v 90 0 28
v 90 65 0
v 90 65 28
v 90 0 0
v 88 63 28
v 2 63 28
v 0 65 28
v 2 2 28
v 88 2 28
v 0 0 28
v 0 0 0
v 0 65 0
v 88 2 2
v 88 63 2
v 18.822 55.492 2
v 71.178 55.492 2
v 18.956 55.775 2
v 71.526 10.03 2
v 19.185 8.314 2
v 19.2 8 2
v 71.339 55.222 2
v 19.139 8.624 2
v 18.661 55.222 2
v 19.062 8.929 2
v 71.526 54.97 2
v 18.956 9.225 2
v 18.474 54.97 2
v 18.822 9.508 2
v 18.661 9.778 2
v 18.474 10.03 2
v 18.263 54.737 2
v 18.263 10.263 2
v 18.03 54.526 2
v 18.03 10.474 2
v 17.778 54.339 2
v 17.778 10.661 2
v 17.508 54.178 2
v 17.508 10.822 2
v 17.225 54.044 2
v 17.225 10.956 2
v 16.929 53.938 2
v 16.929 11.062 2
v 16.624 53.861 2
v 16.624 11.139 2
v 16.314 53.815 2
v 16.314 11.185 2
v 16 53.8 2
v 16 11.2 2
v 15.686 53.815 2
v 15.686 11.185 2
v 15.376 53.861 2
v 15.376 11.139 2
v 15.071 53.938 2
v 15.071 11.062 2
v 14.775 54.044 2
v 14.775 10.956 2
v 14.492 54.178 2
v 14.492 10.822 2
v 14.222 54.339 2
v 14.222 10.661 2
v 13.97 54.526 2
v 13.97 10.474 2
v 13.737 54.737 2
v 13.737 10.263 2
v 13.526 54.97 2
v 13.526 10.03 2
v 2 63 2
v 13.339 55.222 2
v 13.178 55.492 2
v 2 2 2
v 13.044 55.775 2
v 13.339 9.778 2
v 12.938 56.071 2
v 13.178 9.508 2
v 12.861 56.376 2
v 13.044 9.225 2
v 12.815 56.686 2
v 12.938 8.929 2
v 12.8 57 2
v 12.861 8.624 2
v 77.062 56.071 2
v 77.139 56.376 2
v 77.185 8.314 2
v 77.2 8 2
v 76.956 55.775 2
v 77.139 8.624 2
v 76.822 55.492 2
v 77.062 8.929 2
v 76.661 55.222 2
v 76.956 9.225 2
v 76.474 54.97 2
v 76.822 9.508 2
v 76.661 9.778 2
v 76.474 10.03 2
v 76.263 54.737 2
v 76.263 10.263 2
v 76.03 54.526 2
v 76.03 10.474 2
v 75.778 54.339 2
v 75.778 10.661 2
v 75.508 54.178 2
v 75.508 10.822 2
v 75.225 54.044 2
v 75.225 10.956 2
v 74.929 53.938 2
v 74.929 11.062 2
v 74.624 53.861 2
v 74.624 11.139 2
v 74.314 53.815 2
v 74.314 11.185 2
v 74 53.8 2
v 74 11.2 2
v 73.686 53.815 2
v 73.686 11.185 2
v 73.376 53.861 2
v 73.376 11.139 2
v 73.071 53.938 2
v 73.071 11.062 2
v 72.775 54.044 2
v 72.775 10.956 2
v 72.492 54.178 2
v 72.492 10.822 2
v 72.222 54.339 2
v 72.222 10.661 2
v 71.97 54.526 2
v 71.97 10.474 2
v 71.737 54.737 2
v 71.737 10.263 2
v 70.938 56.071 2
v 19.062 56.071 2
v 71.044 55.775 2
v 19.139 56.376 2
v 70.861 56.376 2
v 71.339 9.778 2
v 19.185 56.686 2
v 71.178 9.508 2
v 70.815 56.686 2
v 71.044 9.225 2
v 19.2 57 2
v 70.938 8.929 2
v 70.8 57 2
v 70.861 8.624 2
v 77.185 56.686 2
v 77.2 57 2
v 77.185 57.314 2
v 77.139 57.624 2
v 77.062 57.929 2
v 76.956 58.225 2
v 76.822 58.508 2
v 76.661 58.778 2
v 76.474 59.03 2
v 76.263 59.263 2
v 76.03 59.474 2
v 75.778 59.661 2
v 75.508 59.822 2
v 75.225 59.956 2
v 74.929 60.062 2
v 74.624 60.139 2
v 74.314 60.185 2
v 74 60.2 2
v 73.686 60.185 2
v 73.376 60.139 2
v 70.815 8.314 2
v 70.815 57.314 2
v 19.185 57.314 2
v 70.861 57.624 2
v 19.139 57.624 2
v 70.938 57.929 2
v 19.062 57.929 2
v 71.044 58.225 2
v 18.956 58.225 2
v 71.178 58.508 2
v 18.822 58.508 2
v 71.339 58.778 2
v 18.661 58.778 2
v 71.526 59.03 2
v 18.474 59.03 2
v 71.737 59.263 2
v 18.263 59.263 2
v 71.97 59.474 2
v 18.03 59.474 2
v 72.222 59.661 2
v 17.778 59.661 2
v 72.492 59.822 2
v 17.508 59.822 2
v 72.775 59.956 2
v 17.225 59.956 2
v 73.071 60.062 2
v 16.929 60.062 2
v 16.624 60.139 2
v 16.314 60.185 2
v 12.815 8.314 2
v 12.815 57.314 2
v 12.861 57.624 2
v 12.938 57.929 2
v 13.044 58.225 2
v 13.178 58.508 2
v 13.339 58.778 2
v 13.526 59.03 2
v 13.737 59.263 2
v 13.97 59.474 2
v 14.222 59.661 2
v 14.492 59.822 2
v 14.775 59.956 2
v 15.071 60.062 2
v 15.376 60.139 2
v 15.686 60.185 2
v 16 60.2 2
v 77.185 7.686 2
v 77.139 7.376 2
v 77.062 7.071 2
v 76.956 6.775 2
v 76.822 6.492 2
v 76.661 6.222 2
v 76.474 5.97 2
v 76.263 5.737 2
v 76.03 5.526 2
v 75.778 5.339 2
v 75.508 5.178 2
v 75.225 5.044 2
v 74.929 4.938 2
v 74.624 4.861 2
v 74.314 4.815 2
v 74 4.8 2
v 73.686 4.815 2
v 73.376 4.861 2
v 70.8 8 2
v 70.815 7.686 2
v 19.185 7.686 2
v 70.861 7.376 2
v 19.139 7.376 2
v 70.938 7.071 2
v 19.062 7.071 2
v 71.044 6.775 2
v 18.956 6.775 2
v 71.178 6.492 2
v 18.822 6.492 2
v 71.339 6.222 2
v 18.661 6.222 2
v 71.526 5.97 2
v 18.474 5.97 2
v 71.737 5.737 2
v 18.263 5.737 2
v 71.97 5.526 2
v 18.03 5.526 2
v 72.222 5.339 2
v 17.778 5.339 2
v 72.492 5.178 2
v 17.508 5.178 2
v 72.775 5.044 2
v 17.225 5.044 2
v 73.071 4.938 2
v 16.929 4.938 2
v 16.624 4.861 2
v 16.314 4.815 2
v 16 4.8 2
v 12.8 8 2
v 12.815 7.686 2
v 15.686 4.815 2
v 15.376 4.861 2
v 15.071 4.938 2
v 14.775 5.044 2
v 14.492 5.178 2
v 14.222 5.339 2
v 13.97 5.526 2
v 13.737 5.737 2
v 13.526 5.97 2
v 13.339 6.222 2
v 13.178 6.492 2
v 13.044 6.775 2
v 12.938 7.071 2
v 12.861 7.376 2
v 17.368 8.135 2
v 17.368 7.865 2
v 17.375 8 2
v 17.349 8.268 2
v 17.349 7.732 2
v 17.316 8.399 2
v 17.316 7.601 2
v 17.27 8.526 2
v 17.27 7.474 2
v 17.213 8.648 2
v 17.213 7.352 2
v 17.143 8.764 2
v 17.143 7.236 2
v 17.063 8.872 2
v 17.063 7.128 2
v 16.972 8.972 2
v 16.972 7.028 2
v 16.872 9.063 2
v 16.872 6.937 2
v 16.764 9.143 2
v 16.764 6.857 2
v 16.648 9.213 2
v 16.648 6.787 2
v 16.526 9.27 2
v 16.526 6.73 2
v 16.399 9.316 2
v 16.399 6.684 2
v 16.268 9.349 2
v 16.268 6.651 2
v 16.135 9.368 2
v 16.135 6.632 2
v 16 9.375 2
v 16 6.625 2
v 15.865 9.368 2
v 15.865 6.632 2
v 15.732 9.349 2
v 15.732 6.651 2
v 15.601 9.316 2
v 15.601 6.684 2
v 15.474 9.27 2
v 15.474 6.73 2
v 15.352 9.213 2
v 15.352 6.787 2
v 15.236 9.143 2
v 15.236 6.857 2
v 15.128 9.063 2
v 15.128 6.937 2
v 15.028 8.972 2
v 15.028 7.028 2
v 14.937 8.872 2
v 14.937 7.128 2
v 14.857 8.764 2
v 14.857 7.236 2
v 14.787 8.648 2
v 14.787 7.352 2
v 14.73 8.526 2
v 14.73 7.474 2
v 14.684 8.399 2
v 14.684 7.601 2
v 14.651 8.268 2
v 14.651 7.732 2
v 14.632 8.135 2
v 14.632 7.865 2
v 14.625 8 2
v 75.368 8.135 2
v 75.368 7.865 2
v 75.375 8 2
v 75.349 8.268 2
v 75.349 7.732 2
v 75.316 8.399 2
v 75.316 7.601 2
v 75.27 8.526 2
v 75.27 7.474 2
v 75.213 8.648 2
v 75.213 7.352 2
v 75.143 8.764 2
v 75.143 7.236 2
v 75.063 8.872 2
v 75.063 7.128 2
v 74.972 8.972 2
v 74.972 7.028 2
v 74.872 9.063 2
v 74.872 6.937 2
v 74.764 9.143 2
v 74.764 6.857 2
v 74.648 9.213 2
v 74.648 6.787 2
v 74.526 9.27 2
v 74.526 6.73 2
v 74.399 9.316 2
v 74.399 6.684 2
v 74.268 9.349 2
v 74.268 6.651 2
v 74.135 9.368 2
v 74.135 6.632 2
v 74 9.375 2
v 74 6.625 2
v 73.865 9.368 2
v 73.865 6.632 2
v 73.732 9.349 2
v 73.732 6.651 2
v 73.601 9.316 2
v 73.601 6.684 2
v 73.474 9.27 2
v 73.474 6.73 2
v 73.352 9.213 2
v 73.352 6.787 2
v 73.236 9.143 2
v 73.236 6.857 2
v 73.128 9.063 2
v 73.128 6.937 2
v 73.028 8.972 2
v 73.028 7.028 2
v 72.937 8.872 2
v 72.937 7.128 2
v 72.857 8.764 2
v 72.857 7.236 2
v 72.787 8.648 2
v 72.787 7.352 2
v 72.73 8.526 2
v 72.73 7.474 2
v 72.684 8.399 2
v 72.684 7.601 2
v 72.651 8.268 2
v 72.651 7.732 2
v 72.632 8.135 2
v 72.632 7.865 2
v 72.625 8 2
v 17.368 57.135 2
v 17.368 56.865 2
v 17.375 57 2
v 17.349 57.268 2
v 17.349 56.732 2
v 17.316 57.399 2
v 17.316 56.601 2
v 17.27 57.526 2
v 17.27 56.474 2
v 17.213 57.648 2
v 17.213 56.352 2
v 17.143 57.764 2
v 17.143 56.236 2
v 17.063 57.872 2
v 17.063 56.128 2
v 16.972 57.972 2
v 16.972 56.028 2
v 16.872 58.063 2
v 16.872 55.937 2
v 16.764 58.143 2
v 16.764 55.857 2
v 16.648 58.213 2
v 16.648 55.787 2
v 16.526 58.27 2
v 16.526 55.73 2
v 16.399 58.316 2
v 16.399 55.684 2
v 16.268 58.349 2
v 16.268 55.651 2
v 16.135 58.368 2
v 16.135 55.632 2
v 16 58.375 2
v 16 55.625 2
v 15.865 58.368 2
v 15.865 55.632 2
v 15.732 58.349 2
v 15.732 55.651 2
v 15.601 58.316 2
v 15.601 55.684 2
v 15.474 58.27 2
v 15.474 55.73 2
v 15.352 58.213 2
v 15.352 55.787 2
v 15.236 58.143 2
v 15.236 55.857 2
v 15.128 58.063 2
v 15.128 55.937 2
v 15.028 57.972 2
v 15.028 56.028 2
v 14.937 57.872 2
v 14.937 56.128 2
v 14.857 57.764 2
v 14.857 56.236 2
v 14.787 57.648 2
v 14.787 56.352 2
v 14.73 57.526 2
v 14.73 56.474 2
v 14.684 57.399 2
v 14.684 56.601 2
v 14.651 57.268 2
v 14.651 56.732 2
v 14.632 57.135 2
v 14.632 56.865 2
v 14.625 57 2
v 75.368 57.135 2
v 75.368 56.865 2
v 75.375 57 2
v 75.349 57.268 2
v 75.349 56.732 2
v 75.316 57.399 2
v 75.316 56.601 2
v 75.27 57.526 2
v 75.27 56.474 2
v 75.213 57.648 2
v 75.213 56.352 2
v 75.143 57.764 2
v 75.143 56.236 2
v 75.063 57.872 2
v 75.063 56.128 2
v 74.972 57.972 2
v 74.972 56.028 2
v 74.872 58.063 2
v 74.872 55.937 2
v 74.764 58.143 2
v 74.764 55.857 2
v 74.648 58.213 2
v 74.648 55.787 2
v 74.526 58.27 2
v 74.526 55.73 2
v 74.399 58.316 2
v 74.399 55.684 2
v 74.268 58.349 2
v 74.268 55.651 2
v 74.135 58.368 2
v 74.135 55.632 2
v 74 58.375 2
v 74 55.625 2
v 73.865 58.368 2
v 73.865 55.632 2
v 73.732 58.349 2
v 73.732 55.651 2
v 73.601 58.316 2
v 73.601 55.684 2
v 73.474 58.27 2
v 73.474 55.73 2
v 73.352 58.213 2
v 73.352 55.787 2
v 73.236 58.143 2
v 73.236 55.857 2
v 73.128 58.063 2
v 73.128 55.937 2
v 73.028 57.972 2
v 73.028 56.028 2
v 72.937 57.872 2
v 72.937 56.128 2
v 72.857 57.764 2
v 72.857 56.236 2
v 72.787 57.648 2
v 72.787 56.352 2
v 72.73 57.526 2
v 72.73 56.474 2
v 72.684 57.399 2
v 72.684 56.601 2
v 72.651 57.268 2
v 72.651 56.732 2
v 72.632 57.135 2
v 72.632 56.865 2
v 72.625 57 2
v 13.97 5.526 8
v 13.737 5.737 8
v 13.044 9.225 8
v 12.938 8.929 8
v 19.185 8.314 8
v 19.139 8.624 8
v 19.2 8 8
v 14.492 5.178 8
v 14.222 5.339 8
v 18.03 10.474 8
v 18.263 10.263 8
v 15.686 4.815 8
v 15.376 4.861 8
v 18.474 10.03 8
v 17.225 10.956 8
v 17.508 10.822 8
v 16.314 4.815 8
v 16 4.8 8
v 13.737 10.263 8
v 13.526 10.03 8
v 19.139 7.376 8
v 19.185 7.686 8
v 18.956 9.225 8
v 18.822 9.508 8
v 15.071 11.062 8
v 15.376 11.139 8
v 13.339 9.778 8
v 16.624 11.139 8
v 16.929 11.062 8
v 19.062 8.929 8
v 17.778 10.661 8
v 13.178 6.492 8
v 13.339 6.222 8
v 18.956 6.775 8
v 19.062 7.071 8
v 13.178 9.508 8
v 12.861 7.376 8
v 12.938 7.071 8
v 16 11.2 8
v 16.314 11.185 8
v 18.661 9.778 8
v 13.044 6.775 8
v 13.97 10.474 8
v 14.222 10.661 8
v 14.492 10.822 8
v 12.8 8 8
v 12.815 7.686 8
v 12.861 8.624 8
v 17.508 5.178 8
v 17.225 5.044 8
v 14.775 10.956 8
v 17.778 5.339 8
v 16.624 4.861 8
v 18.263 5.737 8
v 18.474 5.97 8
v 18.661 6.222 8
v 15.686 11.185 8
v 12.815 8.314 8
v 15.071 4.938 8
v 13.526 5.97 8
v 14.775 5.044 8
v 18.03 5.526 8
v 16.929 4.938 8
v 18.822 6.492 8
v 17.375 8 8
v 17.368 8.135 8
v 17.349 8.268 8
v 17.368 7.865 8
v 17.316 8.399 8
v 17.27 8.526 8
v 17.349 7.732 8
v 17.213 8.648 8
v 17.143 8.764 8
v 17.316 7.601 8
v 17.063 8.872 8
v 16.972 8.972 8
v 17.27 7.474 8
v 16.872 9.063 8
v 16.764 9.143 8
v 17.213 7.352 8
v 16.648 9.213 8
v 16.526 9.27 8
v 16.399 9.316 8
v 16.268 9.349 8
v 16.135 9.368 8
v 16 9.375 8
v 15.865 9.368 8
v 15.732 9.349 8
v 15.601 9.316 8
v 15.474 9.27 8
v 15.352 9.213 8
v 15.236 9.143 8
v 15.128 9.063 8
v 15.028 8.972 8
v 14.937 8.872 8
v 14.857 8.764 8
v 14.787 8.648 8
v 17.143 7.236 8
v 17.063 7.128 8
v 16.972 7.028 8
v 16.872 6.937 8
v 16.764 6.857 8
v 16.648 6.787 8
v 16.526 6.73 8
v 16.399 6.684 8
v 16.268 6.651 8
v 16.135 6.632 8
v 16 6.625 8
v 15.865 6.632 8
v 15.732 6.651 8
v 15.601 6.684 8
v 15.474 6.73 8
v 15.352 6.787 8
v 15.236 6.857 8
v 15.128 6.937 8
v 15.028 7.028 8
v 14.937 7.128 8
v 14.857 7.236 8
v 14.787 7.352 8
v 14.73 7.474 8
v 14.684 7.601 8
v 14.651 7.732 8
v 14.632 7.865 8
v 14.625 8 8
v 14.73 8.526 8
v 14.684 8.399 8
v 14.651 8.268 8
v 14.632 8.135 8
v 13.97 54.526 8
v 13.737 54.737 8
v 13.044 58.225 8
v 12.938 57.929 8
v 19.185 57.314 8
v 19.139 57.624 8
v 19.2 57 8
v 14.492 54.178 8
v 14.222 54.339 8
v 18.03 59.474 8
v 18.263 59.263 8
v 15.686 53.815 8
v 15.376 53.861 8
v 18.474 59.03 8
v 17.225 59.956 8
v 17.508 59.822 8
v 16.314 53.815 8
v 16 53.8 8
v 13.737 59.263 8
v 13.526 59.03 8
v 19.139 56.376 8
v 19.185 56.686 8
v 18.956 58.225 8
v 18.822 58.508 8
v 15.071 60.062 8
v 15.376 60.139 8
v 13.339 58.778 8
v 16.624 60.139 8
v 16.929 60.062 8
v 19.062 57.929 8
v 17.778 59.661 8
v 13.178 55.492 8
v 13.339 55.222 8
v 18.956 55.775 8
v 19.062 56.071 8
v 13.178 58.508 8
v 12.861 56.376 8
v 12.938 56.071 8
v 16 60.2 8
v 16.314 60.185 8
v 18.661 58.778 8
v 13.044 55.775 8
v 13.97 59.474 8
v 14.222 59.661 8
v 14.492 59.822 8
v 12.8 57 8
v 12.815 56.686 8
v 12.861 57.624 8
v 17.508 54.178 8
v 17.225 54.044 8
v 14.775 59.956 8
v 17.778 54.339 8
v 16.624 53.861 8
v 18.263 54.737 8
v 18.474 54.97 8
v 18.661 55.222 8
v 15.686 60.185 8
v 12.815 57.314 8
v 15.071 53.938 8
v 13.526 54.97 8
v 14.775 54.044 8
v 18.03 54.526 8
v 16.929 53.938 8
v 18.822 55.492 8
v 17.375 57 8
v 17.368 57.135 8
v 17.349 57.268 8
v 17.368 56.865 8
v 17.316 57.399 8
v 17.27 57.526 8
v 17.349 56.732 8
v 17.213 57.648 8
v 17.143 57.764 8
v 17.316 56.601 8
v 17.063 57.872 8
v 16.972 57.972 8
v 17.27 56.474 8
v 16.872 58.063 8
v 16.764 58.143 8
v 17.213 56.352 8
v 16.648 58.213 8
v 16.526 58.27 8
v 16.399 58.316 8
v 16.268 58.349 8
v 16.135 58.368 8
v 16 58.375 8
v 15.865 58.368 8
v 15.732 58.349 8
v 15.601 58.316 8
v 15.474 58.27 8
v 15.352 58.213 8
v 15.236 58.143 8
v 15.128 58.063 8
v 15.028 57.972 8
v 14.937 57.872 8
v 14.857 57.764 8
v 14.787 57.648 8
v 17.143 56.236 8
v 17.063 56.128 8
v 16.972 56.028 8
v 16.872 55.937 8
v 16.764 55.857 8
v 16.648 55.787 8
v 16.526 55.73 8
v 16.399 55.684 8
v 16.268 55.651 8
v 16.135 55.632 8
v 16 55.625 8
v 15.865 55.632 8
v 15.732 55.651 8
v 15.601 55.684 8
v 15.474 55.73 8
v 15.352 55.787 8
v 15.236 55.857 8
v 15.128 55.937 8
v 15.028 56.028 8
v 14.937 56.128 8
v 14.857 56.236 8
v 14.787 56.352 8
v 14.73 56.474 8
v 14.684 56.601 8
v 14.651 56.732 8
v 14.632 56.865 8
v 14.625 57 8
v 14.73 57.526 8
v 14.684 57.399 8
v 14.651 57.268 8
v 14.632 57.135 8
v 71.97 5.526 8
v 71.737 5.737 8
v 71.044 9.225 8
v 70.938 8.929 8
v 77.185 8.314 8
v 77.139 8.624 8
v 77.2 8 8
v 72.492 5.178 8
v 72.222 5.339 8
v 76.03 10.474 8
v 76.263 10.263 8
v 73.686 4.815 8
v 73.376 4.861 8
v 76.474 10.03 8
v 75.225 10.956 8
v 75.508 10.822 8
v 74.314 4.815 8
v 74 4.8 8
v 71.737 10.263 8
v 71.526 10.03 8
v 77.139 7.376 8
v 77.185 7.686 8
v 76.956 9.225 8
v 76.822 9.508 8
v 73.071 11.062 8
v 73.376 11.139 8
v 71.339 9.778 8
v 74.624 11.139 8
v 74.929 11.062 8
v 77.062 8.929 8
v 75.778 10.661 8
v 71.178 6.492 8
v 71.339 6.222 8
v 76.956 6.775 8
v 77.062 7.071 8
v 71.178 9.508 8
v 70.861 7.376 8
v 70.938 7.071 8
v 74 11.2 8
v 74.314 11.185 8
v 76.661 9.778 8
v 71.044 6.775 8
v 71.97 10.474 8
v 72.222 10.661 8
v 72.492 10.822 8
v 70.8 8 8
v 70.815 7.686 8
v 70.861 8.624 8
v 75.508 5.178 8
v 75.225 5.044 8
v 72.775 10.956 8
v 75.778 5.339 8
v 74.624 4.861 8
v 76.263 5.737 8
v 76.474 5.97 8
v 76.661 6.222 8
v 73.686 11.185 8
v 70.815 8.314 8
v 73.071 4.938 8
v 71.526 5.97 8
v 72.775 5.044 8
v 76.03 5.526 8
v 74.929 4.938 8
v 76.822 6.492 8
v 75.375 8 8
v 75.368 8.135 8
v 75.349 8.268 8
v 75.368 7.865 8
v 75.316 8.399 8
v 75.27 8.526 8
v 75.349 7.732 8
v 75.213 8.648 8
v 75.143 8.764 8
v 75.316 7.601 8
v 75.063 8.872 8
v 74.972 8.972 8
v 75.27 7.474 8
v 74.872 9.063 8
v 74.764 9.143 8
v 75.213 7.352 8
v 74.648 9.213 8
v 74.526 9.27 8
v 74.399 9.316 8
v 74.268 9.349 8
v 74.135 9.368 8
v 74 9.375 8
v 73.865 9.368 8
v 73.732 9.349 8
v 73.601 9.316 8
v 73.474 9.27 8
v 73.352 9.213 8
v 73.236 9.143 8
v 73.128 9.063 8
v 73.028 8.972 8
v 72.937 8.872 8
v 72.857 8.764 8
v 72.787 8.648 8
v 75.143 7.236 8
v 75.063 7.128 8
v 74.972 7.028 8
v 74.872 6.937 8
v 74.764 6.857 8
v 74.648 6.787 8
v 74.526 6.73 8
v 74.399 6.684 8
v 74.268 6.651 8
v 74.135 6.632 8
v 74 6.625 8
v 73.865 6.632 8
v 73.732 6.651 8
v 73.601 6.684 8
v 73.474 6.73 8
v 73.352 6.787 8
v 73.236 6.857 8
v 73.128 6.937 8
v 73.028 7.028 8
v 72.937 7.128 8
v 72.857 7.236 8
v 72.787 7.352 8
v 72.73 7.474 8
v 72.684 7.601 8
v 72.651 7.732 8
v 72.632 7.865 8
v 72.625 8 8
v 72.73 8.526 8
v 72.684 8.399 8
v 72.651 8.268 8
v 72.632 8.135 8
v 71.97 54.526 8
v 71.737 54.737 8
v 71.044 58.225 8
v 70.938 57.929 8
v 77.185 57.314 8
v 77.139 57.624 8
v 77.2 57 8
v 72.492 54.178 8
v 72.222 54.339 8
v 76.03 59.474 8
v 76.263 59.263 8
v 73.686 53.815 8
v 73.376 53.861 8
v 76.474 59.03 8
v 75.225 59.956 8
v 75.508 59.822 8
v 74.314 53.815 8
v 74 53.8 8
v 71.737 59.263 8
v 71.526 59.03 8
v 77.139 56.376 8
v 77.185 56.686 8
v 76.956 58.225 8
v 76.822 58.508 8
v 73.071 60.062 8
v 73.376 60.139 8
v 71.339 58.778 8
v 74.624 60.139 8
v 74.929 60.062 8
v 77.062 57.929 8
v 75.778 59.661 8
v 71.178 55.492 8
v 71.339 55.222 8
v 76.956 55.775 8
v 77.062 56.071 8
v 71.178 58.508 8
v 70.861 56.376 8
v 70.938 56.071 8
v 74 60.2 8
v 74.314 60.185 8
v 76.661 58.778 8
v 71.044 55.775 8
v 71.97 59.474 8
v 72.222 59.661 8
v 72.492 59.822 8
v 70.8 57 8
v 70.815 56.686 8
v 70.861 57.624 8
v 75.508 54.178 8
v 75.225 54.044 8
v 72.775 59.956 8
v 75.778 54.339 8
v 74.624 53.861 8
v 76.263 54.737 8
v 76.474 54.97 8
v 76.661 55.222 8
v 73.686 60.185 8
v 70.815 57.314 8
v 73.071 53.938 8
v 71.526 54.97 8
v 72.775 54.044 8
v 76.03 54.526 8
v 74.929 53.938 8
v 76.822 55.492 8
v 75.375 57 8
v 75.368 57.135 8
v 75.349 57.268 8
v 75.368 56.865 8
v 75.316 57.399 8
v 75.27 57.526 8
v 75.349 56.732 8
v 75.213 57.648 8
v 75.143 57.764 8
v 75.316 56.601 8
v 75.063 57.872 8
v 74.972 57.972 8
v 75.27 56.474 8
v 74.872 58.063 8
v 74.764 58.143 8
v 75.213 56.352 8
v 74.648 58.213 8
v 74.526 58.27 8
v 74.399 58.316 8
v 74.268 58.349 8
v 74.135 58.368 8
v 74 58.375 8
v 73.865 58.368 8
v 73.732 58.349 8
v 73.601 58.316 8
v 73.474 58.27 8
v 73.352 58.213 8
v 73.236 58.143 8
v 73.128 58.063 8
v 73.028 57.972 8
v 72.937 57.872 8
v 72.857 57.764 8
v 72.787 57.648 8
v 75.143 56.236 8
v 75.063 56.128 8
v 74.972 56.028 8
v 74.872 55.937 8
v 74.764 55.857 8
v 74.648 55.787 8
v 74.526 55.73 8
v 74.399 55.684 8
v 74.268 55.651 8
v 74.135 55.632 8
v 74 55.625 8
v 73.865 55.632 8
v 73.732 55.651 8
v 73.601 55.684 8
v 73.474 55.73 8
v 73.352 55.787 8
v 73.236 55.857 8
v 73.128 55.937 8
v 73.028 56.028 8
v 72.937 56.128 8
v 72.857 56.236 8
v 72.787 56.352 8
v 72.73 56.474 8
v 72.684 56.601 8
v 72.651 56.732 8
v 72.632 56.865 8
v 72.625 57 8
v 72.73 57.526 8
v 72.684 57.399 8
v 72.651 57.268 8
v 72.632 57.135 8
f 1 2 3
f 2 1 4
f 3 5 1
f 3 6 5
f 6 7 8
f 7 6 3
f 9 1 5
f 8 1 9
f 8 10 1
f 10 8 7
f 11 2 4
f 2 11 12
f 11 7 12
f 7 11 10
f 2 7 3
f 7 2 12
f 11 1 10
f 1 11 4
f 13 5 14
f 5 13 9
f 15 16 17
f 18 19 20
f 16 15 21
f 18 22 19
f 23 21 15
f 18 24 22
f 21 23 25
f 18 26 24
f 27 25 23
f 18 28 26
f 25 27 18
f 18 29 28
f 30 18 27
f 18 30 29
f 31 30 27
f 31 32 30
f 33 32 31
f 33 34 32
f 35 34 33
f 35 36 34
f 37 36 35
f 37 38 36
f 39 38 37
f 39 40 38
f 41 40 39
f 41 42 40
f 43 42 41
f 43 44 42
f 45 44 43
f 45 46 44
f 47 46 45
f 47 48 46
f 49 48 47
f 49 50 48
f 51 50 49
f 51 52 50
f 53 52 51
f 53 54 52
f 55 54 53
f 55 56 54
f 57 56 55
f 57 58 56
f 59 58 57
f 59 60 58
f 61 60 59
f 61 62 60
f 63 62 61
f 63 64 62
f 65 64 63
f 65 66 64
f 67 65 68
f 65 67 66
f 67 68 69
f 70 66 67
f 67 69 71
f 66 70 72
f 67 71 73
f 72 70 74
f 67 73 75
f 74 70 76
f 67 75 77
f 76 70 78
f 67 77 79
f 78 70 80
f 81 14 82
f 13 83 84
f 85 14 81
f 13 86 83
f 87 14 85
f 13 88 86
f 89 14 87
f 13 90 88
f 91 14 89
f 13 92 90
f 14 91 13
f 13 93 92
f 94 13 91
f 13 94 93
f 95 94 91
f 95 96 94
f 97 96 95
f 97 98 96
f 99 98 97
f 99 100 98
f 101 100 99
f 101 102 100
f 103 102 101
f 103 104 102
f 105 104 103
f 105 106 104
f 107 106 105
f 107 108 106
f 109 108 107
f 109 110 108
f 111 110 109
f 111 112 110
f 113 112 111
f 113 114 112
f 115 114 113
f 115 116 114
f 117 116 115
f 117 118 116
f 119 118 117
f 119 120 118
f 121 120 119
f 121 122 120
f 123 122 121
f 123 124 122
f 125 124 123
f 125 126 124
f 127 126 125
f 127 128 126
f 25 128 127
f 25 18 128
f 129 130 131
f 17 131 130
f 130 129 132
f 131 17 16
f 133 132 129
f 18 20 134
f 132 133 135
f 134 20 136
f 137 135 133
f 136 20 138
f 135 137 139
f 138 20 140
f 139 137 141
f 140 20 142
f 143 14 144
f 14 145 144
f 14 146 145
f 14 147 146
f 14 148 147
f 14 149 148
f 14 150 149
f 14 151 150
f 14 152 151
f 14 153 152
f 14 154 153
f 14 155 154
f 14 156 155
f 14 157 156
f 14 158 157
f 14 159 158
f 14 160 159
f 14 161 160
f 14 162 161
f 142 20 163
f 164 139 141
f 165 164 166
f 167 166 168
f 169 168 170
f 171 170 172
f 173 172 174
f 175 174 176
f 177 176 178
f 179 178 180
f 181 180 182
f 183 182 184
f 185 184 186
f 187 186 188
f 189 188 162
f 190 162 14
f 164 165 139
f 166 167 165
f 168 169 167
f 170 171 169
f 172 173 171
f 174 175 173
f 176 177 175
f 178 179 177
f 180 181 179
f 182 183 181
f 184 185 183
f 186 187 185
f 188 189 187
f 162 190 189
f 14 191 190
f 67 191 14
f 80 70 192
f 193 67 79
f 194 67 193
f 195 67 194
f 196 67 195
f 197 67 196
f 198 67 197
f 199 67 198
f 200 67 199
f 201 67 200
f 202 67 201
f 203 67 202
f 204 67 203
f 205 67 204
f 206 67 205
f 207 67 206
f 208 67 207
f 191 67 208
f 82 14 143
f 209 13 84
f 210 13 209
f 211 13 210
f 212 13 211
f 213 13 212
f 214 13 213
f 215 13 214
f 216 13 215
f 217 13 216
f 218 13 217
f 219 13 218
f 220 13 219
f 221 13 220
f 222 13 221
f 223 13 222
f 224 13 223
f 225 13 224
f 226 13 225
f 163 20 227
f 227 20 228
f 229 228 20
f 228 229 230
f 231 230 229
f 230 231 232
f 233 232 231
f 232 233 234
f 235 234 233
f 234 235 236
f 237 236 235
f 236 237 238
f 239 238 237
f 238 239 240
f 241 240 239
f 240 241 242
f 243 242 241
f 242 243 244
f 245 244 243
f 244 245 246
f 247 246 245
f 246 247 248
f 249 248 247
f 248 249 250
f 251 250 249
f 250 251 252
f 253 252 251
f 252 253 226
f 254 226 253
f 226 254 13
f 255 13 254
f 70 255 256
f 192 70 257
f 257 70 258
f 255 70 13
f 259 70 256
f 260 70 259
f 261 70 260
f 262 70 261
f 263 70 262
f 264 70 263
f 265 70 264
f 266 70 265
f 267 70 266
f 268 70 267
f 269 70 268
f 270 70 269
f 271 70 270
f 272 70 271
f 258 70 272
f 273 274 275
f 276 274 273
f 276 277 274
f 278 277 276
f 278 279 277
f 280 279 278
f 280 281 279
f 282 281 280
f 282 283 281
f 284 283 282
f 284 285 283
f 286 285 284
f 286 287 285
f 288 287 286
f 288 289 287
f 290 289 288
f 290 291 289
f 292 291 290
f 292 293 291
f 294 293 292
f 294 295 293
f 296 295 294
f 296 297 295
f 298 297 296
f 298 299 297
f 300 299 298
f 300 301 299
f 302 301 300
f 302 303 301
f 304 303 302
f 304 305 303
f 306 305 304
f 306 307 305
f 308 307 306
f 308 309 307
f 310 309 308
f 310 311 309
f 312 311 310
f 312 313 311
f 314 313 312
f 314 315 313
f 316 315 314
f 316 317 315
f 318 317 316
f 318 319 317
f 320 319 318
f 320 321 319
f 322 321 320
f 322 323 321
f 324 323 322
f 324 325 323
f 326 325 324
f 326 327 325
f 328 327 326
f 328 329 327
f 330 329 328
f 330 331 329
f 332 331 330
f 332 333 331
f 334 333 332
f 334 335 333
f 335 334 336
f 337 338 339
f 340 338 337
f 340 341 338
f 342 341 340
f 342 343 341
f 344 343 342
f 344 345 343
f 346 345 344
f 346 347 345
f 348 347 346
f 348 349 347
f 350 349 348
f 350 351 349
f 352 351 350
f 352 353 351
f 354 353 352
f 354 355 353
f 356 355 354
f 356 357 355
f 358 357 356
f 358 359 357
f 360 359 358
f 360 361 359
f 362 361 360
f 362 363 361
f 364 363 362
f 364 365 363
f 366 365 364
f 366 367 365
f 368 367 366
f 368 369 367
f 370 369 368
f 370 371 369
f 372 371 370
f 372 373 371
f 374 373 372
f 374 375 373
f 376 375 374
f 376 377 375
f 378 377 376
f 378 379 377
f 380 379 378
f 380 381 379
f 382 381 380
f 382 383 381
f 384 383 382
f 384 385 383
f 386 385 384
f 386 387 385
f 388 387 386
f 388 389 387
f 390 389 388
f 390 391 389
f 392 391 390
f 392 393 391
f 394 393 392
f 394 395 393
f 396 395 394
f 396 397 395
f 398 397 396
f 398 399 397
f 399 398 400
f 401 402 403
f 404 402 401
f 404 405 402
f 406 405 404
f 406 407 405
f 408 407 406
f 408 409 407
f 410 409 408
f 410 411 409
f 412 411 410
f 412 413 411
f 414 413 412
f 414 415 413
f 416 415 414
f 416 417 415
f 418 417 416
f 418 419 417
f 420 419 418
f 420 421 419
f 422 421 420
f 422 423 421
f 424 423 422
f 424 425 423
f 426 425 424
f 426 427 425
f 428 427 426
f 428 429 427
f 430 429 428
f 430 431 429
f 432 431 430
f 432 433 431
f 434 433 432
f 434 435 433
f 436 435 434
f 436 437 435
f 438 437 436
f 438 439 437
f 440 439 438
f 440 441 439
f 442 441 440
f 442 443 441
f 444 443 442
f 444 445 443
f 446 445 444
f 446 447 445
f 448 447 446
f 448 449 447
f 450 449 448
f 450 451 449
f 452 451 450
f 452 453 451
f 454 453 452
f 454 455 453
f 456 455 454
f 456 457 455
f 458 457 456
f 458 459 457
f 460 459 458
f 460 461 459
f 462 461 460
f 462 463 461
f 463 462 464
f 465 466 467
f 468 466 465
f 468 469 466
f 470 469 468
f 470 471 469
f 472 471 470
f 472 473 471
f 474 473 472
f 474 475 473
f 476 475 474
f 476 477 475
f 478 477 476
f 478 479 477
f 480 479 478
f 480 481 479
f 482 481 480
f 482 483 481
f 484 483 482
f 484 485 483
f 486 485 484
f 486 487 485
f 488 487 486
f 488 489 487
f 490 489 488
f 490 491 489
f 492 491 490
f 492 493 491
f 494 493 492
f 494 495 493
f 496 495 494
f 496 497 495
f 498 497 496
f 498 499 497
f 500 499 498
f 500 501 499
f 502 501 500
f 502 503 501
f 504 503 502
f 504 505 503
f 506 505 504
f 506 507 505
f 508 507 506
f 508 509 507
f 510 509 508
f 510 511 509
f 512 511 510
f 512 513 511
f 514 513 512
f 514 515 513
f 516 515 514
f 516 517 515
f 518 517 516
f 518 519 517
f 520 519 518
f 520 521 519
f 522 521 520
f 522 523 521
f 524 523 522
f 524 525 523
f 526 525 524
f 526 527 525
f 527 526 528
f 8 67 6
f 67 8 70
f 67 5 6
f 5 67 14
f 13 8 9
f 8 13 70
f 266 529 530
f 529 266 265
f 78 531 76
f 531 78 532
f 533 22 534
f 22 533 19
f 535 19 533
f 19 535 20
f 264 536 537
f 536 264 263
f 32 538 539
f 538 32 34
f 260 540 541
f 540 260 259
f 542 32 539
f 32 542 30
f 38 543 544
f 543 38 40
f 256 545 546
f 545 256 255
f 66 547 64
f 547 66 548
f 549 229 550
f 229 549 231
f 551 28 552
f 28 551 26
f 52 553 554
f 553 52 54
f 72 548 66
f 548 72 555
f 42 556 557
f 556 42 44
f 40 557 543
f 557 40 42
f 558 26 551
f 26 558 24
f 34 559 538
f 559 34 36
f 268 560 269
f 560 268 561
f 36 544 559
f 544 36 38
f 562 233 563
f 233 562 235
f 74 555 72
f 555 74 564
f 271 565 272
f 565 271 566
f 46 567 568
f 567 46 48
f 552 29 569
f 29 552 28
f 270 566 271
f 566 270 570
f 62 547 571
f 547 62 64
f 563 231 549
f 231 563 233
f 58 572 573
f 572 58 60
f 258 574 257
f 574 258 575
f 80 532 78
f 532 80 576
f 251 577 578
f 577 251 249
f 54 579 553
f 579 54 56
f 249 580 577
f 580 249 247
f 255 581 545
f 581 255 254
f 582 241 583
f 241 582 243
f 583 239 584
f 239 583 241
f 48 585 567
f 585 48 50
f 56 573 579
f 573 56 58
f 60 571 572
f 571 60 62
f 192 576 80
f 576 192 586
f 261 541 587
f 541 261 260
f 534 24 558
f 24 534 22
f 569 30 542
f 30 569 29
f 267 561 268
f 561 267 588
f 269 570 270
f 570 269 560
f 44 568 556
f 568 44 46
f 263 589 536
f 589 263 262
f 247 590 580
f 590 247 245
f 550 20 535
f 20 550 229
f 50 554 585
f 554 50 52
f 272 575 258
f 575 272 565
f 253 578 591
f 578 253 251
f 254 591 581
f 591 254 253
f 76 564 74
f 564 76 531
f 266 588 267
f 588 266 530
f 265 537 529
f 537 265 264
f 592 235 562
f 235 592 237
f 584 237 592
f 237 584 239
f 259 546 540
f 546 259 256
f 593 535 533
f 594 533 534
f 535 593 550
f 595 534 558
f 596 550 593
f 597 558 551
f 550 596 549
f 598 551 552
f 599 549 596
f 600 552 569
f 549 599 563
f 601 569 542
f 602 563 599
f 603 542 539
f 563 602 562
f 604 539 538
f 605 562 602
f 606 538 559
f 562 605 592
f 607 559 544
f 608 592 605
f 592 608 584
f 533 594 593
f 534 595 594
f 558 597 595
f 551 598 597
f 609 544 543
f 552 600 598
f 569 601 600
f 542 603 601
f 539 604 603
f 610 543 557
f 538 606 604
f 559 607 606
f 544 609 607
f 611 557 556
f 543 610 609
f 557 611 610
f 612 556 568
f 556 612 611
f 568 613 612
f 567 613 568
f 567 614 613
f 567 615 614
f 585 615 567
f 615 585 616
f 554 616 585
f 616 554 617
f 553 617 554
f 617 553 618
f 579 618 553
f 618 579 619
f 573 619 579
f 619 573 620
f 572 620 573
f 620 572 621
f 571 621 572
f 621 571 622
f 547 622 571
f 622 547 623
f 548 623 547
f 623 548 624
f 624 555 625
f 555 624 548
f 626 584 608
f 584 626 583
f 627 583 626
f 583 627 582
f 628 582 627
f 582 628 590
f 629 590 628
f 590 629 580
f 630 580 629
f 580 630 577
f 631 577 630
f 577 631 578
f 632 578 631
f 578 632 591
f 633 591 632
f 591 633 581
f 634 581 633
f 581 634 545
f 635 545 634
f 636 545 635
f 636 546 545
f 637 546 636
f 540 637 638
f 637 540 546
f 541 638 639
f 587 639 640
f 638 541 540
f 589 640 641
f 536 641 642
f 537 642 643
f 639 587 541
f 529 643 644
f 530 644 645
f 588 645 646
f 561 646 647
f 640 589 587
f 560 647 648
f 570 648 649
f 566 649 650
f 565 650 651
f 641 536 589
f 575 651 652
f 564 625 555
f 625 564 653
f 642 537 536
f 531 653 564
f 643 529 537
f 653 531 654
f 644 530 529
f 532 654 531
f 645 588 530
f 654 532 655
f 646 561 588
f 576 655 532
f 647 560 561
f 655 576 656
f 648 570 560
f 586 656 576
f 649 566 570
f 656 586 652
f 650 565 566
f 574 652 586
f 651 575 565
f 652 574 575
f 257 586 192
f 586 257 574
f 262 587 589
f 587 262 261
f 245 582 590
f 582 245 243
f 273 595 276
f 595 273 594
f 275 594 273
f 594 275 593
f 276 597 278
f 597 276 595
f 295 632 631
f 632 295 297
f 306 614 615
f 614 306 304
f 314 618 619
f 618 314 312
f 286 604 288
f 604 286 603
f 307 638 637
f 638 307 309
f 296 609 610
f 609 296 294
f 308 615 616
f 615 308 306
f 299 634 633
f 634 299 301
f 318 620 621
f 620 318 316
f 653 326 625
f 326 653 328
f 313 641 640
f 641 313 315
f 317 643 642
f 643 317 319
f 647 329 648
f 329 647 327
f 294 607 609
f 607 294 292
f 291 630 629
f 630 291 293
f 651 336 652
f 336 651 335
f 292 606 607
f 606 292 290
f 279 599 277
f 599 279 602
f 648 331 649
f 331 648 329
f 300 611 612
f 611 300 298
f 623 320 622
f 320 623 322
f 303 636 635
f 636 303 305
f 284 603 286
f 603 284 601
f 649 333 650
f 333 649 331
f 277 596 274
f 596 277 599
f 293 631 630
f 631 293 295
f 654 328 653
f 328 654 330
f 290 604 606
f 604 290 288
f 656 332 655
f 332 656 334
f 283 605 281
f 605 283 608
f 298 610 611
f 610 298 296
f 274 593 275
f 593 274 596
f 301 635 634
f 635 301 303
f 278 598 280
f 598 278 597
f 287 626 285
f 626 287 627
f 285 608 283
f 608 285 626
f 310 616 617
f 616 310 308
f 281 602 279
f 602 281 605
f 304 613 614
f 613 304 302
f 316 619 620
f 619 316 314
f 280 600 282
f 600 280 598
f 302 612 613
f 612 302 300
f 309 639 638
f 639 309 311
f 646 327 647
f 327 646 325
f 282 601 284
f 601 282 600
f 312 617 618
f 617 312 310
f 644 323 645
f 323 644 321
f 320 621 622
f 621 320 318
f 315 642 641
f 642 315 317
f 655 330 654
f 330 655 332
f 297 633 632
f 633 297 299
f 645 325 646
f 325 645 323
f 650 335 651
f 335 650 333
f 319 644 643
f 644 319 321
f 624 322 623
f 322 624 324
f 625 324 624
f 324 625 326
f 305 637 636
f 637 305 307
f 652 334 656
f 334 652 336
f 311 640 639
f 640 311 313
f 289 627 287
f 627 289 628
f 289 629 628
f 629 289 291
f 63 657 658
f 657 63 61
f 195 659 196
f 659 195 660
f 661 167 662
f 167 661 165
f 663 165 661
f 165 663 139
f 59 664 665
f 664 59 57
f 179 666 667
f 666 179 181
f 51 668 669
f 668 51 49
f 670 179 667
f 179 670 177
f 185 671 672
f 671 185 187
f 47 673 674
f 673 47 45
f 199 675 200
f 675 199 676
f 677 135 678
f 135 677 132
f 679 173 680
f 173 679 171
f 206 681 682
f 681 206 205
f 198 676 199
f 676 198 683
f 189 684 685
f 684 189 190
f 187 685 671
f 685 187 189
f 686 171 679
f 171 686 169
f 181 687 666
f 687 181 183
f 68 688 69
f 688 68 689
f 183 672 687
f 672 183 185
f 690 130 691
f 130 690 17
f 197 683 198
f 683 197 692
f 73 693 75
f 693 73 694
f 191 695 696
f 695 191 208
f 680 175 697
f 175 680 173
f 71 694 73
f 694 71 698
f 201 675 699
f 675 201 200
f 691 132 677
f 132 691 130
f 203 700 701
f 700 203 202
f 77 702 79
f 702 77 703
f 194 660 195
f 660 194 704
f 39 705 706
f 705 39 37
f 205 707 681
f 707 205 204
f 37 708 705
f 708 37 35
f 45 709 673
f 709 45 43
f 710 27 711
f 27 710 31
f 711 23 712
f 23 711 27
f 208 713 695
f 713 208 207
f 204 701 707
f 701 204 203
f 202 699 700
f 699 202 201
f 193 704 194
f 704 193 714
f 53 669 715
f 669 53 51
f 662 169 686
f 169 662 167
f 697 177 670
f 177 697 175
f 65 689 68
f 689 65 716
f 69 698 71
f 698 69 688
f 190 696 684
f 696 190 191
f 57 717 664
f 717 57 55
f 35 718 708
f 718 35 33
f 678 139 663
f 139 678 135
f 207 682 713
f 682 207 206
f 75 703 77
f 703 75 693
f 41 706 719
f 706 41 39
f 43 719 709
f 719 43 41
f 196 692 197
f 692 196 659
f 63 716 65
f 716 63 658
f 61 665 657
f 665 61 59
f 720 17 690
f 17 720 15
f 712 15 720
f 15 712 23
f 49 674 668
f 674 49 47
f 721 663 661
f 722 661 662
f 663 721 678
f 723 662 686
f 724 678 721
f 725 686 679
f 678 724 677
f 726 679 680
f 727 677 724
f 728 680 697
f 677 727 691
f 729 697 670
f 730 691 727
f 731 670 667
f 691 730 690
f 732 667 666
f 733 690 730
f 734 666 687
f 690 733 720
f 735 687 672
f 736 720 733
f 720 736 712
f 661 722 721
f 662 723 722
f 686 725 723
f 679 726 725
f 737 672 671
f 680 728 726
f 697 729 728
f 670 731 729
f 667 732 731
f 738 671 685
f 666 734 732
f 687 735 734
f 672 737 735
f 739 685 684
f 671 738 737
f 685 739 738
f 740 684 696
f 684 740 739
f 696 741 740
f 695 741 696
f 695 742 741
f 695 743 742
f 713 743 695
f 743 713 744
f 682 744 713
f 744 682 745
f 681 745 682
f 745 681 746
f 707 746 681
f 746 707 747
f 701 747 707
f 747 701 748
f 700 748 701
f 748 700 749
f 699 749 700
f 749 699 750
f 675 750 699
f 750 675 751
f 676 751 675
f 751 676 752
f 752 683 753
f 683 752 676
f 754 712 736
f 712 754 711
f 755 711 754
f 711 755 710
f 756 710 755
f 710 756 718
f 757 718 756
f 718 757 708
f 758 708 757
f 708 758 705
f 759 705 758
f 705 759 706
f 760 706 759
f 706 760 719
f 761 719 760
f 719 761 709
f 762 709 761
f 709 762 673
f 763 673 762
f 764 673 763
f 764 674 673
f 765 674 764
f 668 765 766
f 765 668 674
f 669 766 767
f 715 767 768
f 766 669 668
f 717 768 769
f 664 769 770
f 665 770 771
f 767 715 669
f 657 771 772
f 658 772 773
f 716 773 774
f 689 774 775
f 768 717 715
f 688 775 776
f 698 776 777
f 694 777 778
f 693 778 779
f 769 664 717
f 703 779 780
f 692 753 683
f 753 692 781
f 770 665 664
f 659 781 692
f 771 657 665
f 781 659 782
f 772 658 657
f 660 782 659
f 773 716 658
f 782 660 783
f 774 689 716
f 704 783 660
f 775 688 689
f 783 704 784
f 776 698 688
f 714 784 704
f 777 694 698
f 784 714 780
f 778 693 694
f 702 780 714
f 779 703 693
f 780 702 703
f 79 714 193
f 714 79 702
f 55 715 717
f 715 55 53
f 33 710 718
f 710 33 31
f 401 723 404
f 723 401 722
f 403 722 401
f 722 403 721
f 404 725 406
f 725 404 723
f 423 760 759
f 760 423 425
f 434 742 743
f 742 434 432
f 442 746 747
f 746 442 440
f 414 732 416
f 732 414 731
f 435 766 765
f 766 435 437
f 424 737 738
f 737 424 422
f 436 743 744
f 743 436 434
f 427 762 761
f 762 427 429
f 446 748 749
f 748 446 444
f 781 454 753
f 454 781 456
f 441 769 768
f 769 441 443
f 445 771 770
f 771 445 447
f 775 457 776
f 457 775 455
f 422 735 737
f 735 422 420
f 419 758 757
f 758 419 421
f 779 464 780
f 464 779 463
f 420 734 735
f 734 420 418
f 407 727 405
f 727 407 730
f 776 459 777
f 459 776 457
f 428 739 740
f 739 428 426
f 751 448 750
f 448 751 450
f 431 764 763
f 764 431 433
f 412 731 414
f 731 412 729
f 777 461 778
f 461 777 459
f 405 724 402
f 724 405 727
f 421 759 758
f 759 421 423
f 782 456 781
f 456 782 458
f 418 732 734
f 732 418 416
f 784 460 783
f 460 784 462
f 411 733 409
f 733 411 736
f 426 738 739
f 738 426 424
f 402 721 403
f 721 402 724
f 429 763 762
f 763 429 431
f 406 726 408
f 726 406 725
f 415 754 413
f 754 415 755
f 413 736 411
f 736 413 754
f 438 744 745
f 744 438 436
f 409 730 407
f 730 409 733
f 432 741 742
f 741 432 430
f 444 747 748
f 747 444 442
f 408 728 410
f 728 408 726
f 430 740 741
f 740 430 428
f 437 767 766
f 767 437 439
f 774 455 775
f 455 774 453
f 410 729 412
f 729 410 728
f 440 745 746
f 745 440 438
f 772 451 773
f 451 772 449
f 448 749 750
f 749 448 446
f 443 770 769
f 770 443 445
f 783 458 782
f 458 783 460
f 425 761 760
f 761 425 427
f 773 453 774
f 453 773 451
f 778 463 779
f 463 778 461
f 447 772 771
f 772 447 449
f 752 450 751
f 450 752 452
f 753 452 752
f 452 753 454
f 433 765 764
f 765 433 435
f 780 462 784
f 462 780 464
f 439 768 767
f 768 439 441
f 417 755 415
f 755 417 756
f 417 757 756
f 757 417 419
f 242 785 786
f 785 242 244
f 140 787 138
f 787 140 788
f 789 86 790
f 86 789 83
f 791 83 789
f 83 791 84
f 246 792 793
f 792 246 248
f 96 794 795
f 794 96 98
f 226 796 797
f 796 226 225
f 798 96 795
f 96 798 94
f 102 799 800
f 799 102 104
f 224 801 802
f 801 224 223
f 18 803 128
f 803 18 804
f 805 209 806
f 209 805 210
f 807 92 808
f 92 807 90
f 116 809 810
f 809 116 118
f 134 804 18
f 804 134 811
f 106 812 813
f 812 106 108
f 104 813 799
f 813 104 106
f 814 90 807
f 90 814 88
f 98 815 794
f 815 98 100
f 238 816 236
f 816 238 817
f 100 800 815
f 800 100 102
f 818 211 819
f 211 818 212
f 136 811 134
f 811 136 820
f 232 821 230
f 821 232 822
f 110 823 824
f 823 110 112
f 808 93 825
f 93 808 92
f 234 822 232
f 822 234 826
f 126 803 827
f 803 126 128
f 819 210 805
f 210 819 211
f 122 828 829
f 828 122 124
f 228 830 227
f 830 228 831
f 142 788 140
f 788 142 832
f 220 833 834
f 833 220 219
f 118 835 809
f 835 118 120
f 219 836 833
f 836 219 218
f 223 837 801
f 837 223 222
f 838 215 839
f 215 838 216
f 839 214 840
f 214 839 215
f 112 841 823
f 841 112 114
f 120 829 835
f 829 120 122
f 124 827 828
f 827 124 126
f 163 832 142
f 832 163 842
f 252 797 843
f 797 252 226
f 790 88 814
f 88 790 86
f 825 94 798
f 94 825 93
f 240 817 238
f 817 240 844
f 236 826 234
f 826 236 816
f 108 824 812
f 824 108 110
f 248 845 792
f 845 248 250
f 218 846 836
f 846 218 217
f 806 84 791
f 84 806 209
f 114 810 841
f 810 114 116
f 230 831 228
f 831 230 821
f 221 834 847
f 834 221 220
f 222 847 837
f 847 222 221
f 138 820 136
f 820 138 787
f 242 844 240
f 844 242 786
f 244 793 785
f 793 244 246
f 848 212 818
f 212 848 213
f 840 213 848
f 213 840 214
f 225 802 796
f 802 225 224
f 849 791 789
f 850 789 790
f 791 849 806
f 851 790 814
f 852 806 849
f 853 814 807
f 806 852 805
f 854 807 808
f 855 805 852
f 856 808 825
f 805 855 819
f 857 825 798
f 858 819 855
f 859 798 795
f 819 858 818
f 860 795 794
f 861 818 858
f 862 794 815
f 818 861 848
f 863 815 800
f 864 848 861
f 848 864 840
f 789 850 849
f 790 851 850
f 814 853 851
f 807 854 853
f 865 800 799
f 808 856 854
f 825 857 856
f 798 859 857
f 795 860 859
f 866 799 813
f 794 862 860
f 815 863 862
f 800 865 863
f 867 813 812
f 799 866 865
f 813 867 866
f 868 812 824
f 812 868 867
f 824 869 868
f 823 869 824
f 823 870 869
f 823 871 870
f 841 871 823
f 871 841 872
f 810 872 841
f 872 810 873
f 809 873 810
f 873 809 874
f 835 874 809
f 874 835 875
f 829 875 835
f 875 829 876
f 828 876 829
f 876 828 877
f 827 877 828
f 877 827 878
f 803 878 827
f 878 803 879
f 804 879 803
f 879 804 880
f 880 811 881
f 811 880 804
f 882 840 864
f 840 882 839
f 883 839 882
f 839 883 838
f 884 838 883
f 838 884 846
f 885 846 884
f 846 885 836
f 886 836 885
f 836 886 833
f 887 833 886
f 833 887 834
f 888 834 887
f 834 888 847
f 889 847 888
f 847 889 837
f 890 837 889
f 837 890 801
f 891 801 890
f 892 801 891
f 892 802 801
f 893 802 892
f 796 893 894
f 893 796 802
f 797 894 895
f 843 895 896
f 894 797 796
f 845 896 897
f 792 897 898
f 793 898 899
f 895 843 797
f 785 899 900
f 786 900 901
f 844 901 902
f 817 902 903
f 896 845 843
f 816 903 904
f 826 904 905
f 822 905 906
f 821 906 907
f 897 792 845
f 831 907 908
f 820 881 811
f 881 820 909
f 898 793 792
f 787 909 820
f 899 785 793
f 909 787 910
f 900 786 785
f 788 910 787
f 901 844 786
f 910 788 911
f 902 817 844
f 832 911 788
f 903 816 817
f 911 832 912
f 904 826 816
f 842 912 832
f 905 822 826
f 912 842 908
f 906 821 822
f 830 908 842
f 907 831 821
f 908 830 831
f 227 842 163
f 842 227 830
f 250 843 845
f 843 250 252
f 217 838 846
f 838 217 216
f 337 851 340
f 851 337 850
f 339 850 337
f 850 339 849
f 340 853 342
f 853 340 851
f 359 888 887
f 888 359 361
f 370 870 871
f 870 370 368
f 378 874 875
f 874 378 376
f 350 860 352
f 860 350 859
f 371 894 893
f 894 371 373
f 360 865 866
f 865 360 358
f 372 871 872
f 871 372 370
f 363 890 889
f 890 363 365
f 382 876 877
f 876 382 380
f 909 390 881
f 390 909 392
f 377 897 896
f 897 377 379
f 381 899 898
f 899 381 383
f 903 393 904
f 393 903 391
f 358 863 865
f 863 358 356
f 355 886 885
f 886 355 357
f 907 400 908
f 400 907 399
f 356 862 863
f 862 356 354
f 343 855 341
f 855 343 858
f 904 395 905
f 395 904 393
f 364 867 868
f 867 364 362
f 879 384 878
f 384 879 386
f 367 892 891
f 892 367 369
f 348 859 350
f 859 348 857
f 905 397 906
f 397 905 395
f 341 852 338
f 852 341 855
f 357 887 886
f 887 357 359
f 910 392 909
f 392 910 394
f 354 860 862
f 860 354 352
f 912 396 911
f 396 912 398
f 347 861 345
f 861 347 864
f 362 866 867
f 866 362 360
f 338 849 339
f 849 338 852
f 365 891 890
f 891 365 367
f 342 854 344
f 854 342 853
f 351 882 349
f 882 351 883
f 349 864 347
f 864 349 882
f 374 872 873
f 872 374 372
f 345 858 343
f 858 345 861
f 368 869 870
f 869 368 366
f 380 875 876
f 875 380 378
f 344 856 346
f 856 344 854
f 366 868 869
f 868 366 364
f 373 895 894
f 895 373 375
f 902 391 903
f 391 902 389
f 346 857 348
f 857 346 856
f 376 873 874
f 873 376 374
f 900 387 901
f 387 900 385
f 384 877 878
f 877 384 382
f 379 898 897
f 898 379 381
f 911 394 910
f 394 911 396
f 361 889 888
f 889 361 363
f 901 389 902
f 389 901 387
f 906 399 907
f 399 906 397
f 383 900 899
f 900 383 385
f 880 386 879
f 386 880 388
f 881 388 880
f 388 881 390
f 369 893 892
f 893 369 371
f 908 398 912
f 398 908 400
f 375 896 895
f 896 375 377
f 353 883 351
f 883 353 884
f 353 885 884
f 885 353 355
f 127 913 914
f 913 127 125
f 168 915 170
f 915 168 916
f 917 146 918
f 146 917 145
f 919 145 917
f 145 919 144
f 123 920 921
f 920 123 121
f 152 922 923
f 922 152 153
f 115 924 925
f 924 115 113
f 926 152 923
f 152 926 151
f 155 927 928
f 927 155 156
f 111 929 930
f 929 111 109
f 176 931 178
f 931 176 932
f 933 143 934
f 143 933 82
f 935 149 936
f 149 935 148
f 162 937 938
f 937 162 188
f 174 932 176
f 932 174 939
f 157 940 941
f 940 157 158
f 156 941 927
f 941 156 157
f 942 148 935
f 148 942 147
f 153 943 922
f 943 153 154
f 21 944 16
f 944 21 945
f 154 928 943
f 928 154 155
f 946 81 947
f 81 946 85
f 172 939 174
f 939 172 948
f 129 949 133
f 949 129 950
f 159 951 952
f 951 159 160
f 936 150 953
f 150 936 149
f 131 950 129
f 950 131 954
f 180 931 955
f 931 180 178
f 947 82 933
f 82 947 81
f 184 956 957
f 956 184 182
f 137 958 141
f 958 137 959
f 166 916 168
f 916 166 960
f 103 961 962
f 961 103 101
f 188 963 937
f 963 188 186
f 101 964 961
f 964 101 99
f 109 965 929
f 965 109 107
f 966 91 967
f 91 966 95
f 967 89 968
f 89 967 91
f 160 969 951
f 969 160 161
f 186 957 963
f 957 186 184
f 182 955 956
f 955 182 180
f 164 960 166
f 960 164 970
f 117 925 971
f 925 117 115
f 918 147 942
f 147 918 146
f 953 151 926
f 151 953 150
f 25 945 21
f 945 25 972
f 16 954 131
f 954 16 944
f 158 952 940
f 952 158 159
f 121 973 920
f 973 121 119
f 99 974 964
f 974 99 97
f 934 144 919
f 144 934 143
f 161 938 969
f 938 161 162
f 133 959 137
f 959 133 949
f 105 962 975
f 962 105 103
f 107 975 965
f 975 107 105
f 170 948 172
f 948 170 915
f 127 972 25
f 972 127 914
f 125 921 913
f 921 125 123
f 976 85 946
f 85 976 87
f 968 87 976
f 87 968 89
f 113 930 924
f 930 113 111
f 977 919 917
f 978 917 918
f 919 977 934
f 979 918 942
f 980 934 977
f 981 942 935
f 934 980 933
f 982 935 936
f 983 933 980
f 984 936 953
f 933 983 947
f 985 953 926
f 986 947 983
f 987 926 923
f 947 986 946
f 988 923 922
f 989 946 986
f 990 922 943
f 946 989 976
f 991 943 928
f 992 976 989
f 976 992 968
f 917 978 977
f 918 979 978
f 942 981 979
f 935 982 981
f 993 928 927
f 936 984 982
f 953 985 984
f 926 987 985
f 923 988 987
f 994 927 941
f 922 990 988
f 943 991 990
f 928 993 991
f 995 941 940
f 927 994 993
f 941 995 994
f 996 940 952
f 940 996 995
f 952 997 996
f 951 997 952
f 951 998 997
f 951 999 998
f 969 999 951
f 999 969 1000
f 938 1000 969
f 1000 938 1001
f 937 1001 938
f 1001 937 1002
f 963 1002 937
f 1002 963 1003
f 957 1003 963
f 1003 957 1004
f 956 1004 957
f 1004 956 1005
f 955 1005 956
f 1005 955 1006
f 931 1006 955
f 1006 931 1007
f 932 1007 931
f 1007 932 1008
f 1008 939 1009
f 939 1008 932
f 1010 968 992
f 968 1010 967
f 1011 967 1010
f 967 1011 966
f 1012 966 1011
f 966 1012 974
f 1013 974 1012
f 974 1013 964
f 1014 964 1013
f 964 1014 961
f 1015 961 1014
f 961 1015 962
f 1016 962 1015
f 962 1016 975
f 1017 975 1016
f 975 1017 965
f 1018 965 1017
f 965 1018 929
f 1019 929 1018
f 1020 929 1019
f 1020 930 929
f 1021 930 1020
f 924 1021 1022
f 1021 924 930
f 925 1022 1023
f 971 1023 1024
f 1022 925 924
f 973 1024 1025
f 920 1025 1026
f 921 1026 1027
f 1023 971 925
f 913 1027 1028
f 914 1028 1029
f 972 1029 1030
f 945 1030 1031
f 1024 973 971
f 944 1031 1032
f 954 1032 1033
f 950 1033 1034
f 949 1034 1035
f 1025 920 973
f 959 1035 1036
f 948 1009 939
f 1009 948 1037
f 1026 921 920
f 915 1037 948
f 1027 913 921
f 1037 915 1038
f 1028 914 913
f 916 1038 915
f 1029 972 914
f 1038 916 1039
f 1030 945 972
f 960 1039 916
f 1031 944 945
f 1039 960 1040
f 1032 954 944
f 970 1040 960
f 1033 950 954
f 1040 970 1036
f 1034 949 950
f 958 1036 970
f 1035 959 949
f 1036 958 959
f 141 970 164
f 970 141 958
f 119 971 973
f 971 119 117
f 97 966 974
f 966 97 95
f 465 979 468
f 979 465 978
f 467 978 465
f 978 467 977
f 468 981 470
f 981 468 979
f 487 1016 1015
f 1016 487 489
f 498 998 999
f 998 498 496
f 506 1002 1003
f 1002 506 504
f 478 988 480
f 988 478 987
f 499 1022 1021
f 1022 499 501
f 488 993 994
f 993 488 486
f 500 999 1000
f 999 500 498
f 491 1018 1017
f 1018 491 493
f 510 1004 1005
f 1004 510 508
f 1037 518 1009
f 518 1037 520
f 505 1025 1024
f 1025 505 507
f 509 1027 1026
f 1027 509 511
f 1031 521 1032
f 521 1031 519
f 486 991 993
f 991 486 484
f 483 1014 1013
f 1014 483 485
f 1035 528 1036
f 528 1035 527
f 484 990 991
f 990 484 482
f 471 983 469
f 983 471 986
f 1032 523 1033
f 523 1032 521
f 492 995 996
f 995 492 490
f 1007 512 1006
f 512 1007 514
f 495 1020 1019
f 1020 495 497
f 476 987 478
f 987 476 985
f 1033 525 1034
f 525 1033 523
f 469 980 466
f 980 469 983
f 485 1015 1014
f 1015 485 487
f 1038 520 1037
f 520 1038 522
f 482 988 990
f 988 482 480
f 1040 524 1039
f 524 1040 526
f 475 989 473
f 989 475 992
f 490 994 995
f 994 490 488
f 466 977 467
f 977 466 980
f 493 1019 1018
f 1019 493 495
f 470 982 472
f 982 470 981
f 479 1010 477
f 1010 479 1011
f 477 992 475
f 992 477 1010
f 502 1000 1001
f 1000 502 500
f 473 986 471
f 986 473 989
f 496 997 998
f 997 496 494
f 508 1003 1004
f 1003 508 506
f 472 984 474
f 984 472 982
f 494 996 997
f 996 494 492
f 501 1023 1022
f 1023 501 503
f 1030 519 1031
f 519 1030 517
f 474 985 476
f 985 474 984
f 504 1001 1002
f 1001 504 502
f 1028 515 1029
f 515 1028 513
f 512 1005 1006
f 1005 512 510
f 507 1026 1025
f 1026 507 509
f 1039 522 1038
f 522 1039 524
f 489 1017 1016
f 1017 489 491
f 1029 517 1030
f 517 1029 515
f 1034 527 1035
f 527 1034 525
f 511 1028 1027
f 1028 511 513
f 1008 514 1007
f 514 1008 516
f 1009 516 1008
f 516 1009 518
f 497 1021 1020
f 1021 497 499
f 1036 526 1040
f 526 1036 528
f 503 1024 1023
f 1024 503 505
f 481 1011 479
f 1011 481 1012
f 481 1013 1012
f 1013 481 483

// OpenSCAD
// Carcasa Raspberry Pi 5 + VESA — generado por Daniela CADStudio
// Unidades: mm. Edita los parametros y re-renderiza.
ancho = 90.0; fondo = 65.0; alto = 28.0;
pared = 2.0; tol = 0.2;
vesa = 75.0; d_vesa = 4.0;
hex_r = 3.0; hex_dx = 8.0;
$fn = 64;

module base() {
    difference() {
        cube([ancho, fondo, alto]);
        translate([pared, pared, pared])
            cube([ancho - 2*pared, fondo - 2*pared, alto]);
    }
}

module agujeros_vesa() {
    for (sx = [-1, 1], sy = [-1, 1])
        translate([ancho/2 + sx*vesa/2, fondo/2 + sy*vesa/2, -1])
            cylinder(h = pared + 2, d = d_vesa);
}

module ventilacion() {
    for (ix = [0 : floor((ancho - 20) / hex_dx)])
        for (iy = [0 : floor((fondo - 20) / hex_dx)])
            translate([10 + ix*hex_dx, 10 + iy*hex_dx, alto - 1])
                cylinder(h = pared + 2, r = hex_r, $fn = 6);
}

module separadores_pcb() {
    for (sx = [-1, 1], sy = [-1, 1])
        translate([ancho/2 + sx*29, fondo/2 + sy*24.5, pared])
            difference() {
                cylinder(h = 6, d = 6 + tol*2);
                translate([0, 0, -1])
                    cylinder(h = 8, d = 2.75);
            }
}

difference() {
    base();
    agujeros_vesa();
    ventilacion();
}
separadores_pcb();
